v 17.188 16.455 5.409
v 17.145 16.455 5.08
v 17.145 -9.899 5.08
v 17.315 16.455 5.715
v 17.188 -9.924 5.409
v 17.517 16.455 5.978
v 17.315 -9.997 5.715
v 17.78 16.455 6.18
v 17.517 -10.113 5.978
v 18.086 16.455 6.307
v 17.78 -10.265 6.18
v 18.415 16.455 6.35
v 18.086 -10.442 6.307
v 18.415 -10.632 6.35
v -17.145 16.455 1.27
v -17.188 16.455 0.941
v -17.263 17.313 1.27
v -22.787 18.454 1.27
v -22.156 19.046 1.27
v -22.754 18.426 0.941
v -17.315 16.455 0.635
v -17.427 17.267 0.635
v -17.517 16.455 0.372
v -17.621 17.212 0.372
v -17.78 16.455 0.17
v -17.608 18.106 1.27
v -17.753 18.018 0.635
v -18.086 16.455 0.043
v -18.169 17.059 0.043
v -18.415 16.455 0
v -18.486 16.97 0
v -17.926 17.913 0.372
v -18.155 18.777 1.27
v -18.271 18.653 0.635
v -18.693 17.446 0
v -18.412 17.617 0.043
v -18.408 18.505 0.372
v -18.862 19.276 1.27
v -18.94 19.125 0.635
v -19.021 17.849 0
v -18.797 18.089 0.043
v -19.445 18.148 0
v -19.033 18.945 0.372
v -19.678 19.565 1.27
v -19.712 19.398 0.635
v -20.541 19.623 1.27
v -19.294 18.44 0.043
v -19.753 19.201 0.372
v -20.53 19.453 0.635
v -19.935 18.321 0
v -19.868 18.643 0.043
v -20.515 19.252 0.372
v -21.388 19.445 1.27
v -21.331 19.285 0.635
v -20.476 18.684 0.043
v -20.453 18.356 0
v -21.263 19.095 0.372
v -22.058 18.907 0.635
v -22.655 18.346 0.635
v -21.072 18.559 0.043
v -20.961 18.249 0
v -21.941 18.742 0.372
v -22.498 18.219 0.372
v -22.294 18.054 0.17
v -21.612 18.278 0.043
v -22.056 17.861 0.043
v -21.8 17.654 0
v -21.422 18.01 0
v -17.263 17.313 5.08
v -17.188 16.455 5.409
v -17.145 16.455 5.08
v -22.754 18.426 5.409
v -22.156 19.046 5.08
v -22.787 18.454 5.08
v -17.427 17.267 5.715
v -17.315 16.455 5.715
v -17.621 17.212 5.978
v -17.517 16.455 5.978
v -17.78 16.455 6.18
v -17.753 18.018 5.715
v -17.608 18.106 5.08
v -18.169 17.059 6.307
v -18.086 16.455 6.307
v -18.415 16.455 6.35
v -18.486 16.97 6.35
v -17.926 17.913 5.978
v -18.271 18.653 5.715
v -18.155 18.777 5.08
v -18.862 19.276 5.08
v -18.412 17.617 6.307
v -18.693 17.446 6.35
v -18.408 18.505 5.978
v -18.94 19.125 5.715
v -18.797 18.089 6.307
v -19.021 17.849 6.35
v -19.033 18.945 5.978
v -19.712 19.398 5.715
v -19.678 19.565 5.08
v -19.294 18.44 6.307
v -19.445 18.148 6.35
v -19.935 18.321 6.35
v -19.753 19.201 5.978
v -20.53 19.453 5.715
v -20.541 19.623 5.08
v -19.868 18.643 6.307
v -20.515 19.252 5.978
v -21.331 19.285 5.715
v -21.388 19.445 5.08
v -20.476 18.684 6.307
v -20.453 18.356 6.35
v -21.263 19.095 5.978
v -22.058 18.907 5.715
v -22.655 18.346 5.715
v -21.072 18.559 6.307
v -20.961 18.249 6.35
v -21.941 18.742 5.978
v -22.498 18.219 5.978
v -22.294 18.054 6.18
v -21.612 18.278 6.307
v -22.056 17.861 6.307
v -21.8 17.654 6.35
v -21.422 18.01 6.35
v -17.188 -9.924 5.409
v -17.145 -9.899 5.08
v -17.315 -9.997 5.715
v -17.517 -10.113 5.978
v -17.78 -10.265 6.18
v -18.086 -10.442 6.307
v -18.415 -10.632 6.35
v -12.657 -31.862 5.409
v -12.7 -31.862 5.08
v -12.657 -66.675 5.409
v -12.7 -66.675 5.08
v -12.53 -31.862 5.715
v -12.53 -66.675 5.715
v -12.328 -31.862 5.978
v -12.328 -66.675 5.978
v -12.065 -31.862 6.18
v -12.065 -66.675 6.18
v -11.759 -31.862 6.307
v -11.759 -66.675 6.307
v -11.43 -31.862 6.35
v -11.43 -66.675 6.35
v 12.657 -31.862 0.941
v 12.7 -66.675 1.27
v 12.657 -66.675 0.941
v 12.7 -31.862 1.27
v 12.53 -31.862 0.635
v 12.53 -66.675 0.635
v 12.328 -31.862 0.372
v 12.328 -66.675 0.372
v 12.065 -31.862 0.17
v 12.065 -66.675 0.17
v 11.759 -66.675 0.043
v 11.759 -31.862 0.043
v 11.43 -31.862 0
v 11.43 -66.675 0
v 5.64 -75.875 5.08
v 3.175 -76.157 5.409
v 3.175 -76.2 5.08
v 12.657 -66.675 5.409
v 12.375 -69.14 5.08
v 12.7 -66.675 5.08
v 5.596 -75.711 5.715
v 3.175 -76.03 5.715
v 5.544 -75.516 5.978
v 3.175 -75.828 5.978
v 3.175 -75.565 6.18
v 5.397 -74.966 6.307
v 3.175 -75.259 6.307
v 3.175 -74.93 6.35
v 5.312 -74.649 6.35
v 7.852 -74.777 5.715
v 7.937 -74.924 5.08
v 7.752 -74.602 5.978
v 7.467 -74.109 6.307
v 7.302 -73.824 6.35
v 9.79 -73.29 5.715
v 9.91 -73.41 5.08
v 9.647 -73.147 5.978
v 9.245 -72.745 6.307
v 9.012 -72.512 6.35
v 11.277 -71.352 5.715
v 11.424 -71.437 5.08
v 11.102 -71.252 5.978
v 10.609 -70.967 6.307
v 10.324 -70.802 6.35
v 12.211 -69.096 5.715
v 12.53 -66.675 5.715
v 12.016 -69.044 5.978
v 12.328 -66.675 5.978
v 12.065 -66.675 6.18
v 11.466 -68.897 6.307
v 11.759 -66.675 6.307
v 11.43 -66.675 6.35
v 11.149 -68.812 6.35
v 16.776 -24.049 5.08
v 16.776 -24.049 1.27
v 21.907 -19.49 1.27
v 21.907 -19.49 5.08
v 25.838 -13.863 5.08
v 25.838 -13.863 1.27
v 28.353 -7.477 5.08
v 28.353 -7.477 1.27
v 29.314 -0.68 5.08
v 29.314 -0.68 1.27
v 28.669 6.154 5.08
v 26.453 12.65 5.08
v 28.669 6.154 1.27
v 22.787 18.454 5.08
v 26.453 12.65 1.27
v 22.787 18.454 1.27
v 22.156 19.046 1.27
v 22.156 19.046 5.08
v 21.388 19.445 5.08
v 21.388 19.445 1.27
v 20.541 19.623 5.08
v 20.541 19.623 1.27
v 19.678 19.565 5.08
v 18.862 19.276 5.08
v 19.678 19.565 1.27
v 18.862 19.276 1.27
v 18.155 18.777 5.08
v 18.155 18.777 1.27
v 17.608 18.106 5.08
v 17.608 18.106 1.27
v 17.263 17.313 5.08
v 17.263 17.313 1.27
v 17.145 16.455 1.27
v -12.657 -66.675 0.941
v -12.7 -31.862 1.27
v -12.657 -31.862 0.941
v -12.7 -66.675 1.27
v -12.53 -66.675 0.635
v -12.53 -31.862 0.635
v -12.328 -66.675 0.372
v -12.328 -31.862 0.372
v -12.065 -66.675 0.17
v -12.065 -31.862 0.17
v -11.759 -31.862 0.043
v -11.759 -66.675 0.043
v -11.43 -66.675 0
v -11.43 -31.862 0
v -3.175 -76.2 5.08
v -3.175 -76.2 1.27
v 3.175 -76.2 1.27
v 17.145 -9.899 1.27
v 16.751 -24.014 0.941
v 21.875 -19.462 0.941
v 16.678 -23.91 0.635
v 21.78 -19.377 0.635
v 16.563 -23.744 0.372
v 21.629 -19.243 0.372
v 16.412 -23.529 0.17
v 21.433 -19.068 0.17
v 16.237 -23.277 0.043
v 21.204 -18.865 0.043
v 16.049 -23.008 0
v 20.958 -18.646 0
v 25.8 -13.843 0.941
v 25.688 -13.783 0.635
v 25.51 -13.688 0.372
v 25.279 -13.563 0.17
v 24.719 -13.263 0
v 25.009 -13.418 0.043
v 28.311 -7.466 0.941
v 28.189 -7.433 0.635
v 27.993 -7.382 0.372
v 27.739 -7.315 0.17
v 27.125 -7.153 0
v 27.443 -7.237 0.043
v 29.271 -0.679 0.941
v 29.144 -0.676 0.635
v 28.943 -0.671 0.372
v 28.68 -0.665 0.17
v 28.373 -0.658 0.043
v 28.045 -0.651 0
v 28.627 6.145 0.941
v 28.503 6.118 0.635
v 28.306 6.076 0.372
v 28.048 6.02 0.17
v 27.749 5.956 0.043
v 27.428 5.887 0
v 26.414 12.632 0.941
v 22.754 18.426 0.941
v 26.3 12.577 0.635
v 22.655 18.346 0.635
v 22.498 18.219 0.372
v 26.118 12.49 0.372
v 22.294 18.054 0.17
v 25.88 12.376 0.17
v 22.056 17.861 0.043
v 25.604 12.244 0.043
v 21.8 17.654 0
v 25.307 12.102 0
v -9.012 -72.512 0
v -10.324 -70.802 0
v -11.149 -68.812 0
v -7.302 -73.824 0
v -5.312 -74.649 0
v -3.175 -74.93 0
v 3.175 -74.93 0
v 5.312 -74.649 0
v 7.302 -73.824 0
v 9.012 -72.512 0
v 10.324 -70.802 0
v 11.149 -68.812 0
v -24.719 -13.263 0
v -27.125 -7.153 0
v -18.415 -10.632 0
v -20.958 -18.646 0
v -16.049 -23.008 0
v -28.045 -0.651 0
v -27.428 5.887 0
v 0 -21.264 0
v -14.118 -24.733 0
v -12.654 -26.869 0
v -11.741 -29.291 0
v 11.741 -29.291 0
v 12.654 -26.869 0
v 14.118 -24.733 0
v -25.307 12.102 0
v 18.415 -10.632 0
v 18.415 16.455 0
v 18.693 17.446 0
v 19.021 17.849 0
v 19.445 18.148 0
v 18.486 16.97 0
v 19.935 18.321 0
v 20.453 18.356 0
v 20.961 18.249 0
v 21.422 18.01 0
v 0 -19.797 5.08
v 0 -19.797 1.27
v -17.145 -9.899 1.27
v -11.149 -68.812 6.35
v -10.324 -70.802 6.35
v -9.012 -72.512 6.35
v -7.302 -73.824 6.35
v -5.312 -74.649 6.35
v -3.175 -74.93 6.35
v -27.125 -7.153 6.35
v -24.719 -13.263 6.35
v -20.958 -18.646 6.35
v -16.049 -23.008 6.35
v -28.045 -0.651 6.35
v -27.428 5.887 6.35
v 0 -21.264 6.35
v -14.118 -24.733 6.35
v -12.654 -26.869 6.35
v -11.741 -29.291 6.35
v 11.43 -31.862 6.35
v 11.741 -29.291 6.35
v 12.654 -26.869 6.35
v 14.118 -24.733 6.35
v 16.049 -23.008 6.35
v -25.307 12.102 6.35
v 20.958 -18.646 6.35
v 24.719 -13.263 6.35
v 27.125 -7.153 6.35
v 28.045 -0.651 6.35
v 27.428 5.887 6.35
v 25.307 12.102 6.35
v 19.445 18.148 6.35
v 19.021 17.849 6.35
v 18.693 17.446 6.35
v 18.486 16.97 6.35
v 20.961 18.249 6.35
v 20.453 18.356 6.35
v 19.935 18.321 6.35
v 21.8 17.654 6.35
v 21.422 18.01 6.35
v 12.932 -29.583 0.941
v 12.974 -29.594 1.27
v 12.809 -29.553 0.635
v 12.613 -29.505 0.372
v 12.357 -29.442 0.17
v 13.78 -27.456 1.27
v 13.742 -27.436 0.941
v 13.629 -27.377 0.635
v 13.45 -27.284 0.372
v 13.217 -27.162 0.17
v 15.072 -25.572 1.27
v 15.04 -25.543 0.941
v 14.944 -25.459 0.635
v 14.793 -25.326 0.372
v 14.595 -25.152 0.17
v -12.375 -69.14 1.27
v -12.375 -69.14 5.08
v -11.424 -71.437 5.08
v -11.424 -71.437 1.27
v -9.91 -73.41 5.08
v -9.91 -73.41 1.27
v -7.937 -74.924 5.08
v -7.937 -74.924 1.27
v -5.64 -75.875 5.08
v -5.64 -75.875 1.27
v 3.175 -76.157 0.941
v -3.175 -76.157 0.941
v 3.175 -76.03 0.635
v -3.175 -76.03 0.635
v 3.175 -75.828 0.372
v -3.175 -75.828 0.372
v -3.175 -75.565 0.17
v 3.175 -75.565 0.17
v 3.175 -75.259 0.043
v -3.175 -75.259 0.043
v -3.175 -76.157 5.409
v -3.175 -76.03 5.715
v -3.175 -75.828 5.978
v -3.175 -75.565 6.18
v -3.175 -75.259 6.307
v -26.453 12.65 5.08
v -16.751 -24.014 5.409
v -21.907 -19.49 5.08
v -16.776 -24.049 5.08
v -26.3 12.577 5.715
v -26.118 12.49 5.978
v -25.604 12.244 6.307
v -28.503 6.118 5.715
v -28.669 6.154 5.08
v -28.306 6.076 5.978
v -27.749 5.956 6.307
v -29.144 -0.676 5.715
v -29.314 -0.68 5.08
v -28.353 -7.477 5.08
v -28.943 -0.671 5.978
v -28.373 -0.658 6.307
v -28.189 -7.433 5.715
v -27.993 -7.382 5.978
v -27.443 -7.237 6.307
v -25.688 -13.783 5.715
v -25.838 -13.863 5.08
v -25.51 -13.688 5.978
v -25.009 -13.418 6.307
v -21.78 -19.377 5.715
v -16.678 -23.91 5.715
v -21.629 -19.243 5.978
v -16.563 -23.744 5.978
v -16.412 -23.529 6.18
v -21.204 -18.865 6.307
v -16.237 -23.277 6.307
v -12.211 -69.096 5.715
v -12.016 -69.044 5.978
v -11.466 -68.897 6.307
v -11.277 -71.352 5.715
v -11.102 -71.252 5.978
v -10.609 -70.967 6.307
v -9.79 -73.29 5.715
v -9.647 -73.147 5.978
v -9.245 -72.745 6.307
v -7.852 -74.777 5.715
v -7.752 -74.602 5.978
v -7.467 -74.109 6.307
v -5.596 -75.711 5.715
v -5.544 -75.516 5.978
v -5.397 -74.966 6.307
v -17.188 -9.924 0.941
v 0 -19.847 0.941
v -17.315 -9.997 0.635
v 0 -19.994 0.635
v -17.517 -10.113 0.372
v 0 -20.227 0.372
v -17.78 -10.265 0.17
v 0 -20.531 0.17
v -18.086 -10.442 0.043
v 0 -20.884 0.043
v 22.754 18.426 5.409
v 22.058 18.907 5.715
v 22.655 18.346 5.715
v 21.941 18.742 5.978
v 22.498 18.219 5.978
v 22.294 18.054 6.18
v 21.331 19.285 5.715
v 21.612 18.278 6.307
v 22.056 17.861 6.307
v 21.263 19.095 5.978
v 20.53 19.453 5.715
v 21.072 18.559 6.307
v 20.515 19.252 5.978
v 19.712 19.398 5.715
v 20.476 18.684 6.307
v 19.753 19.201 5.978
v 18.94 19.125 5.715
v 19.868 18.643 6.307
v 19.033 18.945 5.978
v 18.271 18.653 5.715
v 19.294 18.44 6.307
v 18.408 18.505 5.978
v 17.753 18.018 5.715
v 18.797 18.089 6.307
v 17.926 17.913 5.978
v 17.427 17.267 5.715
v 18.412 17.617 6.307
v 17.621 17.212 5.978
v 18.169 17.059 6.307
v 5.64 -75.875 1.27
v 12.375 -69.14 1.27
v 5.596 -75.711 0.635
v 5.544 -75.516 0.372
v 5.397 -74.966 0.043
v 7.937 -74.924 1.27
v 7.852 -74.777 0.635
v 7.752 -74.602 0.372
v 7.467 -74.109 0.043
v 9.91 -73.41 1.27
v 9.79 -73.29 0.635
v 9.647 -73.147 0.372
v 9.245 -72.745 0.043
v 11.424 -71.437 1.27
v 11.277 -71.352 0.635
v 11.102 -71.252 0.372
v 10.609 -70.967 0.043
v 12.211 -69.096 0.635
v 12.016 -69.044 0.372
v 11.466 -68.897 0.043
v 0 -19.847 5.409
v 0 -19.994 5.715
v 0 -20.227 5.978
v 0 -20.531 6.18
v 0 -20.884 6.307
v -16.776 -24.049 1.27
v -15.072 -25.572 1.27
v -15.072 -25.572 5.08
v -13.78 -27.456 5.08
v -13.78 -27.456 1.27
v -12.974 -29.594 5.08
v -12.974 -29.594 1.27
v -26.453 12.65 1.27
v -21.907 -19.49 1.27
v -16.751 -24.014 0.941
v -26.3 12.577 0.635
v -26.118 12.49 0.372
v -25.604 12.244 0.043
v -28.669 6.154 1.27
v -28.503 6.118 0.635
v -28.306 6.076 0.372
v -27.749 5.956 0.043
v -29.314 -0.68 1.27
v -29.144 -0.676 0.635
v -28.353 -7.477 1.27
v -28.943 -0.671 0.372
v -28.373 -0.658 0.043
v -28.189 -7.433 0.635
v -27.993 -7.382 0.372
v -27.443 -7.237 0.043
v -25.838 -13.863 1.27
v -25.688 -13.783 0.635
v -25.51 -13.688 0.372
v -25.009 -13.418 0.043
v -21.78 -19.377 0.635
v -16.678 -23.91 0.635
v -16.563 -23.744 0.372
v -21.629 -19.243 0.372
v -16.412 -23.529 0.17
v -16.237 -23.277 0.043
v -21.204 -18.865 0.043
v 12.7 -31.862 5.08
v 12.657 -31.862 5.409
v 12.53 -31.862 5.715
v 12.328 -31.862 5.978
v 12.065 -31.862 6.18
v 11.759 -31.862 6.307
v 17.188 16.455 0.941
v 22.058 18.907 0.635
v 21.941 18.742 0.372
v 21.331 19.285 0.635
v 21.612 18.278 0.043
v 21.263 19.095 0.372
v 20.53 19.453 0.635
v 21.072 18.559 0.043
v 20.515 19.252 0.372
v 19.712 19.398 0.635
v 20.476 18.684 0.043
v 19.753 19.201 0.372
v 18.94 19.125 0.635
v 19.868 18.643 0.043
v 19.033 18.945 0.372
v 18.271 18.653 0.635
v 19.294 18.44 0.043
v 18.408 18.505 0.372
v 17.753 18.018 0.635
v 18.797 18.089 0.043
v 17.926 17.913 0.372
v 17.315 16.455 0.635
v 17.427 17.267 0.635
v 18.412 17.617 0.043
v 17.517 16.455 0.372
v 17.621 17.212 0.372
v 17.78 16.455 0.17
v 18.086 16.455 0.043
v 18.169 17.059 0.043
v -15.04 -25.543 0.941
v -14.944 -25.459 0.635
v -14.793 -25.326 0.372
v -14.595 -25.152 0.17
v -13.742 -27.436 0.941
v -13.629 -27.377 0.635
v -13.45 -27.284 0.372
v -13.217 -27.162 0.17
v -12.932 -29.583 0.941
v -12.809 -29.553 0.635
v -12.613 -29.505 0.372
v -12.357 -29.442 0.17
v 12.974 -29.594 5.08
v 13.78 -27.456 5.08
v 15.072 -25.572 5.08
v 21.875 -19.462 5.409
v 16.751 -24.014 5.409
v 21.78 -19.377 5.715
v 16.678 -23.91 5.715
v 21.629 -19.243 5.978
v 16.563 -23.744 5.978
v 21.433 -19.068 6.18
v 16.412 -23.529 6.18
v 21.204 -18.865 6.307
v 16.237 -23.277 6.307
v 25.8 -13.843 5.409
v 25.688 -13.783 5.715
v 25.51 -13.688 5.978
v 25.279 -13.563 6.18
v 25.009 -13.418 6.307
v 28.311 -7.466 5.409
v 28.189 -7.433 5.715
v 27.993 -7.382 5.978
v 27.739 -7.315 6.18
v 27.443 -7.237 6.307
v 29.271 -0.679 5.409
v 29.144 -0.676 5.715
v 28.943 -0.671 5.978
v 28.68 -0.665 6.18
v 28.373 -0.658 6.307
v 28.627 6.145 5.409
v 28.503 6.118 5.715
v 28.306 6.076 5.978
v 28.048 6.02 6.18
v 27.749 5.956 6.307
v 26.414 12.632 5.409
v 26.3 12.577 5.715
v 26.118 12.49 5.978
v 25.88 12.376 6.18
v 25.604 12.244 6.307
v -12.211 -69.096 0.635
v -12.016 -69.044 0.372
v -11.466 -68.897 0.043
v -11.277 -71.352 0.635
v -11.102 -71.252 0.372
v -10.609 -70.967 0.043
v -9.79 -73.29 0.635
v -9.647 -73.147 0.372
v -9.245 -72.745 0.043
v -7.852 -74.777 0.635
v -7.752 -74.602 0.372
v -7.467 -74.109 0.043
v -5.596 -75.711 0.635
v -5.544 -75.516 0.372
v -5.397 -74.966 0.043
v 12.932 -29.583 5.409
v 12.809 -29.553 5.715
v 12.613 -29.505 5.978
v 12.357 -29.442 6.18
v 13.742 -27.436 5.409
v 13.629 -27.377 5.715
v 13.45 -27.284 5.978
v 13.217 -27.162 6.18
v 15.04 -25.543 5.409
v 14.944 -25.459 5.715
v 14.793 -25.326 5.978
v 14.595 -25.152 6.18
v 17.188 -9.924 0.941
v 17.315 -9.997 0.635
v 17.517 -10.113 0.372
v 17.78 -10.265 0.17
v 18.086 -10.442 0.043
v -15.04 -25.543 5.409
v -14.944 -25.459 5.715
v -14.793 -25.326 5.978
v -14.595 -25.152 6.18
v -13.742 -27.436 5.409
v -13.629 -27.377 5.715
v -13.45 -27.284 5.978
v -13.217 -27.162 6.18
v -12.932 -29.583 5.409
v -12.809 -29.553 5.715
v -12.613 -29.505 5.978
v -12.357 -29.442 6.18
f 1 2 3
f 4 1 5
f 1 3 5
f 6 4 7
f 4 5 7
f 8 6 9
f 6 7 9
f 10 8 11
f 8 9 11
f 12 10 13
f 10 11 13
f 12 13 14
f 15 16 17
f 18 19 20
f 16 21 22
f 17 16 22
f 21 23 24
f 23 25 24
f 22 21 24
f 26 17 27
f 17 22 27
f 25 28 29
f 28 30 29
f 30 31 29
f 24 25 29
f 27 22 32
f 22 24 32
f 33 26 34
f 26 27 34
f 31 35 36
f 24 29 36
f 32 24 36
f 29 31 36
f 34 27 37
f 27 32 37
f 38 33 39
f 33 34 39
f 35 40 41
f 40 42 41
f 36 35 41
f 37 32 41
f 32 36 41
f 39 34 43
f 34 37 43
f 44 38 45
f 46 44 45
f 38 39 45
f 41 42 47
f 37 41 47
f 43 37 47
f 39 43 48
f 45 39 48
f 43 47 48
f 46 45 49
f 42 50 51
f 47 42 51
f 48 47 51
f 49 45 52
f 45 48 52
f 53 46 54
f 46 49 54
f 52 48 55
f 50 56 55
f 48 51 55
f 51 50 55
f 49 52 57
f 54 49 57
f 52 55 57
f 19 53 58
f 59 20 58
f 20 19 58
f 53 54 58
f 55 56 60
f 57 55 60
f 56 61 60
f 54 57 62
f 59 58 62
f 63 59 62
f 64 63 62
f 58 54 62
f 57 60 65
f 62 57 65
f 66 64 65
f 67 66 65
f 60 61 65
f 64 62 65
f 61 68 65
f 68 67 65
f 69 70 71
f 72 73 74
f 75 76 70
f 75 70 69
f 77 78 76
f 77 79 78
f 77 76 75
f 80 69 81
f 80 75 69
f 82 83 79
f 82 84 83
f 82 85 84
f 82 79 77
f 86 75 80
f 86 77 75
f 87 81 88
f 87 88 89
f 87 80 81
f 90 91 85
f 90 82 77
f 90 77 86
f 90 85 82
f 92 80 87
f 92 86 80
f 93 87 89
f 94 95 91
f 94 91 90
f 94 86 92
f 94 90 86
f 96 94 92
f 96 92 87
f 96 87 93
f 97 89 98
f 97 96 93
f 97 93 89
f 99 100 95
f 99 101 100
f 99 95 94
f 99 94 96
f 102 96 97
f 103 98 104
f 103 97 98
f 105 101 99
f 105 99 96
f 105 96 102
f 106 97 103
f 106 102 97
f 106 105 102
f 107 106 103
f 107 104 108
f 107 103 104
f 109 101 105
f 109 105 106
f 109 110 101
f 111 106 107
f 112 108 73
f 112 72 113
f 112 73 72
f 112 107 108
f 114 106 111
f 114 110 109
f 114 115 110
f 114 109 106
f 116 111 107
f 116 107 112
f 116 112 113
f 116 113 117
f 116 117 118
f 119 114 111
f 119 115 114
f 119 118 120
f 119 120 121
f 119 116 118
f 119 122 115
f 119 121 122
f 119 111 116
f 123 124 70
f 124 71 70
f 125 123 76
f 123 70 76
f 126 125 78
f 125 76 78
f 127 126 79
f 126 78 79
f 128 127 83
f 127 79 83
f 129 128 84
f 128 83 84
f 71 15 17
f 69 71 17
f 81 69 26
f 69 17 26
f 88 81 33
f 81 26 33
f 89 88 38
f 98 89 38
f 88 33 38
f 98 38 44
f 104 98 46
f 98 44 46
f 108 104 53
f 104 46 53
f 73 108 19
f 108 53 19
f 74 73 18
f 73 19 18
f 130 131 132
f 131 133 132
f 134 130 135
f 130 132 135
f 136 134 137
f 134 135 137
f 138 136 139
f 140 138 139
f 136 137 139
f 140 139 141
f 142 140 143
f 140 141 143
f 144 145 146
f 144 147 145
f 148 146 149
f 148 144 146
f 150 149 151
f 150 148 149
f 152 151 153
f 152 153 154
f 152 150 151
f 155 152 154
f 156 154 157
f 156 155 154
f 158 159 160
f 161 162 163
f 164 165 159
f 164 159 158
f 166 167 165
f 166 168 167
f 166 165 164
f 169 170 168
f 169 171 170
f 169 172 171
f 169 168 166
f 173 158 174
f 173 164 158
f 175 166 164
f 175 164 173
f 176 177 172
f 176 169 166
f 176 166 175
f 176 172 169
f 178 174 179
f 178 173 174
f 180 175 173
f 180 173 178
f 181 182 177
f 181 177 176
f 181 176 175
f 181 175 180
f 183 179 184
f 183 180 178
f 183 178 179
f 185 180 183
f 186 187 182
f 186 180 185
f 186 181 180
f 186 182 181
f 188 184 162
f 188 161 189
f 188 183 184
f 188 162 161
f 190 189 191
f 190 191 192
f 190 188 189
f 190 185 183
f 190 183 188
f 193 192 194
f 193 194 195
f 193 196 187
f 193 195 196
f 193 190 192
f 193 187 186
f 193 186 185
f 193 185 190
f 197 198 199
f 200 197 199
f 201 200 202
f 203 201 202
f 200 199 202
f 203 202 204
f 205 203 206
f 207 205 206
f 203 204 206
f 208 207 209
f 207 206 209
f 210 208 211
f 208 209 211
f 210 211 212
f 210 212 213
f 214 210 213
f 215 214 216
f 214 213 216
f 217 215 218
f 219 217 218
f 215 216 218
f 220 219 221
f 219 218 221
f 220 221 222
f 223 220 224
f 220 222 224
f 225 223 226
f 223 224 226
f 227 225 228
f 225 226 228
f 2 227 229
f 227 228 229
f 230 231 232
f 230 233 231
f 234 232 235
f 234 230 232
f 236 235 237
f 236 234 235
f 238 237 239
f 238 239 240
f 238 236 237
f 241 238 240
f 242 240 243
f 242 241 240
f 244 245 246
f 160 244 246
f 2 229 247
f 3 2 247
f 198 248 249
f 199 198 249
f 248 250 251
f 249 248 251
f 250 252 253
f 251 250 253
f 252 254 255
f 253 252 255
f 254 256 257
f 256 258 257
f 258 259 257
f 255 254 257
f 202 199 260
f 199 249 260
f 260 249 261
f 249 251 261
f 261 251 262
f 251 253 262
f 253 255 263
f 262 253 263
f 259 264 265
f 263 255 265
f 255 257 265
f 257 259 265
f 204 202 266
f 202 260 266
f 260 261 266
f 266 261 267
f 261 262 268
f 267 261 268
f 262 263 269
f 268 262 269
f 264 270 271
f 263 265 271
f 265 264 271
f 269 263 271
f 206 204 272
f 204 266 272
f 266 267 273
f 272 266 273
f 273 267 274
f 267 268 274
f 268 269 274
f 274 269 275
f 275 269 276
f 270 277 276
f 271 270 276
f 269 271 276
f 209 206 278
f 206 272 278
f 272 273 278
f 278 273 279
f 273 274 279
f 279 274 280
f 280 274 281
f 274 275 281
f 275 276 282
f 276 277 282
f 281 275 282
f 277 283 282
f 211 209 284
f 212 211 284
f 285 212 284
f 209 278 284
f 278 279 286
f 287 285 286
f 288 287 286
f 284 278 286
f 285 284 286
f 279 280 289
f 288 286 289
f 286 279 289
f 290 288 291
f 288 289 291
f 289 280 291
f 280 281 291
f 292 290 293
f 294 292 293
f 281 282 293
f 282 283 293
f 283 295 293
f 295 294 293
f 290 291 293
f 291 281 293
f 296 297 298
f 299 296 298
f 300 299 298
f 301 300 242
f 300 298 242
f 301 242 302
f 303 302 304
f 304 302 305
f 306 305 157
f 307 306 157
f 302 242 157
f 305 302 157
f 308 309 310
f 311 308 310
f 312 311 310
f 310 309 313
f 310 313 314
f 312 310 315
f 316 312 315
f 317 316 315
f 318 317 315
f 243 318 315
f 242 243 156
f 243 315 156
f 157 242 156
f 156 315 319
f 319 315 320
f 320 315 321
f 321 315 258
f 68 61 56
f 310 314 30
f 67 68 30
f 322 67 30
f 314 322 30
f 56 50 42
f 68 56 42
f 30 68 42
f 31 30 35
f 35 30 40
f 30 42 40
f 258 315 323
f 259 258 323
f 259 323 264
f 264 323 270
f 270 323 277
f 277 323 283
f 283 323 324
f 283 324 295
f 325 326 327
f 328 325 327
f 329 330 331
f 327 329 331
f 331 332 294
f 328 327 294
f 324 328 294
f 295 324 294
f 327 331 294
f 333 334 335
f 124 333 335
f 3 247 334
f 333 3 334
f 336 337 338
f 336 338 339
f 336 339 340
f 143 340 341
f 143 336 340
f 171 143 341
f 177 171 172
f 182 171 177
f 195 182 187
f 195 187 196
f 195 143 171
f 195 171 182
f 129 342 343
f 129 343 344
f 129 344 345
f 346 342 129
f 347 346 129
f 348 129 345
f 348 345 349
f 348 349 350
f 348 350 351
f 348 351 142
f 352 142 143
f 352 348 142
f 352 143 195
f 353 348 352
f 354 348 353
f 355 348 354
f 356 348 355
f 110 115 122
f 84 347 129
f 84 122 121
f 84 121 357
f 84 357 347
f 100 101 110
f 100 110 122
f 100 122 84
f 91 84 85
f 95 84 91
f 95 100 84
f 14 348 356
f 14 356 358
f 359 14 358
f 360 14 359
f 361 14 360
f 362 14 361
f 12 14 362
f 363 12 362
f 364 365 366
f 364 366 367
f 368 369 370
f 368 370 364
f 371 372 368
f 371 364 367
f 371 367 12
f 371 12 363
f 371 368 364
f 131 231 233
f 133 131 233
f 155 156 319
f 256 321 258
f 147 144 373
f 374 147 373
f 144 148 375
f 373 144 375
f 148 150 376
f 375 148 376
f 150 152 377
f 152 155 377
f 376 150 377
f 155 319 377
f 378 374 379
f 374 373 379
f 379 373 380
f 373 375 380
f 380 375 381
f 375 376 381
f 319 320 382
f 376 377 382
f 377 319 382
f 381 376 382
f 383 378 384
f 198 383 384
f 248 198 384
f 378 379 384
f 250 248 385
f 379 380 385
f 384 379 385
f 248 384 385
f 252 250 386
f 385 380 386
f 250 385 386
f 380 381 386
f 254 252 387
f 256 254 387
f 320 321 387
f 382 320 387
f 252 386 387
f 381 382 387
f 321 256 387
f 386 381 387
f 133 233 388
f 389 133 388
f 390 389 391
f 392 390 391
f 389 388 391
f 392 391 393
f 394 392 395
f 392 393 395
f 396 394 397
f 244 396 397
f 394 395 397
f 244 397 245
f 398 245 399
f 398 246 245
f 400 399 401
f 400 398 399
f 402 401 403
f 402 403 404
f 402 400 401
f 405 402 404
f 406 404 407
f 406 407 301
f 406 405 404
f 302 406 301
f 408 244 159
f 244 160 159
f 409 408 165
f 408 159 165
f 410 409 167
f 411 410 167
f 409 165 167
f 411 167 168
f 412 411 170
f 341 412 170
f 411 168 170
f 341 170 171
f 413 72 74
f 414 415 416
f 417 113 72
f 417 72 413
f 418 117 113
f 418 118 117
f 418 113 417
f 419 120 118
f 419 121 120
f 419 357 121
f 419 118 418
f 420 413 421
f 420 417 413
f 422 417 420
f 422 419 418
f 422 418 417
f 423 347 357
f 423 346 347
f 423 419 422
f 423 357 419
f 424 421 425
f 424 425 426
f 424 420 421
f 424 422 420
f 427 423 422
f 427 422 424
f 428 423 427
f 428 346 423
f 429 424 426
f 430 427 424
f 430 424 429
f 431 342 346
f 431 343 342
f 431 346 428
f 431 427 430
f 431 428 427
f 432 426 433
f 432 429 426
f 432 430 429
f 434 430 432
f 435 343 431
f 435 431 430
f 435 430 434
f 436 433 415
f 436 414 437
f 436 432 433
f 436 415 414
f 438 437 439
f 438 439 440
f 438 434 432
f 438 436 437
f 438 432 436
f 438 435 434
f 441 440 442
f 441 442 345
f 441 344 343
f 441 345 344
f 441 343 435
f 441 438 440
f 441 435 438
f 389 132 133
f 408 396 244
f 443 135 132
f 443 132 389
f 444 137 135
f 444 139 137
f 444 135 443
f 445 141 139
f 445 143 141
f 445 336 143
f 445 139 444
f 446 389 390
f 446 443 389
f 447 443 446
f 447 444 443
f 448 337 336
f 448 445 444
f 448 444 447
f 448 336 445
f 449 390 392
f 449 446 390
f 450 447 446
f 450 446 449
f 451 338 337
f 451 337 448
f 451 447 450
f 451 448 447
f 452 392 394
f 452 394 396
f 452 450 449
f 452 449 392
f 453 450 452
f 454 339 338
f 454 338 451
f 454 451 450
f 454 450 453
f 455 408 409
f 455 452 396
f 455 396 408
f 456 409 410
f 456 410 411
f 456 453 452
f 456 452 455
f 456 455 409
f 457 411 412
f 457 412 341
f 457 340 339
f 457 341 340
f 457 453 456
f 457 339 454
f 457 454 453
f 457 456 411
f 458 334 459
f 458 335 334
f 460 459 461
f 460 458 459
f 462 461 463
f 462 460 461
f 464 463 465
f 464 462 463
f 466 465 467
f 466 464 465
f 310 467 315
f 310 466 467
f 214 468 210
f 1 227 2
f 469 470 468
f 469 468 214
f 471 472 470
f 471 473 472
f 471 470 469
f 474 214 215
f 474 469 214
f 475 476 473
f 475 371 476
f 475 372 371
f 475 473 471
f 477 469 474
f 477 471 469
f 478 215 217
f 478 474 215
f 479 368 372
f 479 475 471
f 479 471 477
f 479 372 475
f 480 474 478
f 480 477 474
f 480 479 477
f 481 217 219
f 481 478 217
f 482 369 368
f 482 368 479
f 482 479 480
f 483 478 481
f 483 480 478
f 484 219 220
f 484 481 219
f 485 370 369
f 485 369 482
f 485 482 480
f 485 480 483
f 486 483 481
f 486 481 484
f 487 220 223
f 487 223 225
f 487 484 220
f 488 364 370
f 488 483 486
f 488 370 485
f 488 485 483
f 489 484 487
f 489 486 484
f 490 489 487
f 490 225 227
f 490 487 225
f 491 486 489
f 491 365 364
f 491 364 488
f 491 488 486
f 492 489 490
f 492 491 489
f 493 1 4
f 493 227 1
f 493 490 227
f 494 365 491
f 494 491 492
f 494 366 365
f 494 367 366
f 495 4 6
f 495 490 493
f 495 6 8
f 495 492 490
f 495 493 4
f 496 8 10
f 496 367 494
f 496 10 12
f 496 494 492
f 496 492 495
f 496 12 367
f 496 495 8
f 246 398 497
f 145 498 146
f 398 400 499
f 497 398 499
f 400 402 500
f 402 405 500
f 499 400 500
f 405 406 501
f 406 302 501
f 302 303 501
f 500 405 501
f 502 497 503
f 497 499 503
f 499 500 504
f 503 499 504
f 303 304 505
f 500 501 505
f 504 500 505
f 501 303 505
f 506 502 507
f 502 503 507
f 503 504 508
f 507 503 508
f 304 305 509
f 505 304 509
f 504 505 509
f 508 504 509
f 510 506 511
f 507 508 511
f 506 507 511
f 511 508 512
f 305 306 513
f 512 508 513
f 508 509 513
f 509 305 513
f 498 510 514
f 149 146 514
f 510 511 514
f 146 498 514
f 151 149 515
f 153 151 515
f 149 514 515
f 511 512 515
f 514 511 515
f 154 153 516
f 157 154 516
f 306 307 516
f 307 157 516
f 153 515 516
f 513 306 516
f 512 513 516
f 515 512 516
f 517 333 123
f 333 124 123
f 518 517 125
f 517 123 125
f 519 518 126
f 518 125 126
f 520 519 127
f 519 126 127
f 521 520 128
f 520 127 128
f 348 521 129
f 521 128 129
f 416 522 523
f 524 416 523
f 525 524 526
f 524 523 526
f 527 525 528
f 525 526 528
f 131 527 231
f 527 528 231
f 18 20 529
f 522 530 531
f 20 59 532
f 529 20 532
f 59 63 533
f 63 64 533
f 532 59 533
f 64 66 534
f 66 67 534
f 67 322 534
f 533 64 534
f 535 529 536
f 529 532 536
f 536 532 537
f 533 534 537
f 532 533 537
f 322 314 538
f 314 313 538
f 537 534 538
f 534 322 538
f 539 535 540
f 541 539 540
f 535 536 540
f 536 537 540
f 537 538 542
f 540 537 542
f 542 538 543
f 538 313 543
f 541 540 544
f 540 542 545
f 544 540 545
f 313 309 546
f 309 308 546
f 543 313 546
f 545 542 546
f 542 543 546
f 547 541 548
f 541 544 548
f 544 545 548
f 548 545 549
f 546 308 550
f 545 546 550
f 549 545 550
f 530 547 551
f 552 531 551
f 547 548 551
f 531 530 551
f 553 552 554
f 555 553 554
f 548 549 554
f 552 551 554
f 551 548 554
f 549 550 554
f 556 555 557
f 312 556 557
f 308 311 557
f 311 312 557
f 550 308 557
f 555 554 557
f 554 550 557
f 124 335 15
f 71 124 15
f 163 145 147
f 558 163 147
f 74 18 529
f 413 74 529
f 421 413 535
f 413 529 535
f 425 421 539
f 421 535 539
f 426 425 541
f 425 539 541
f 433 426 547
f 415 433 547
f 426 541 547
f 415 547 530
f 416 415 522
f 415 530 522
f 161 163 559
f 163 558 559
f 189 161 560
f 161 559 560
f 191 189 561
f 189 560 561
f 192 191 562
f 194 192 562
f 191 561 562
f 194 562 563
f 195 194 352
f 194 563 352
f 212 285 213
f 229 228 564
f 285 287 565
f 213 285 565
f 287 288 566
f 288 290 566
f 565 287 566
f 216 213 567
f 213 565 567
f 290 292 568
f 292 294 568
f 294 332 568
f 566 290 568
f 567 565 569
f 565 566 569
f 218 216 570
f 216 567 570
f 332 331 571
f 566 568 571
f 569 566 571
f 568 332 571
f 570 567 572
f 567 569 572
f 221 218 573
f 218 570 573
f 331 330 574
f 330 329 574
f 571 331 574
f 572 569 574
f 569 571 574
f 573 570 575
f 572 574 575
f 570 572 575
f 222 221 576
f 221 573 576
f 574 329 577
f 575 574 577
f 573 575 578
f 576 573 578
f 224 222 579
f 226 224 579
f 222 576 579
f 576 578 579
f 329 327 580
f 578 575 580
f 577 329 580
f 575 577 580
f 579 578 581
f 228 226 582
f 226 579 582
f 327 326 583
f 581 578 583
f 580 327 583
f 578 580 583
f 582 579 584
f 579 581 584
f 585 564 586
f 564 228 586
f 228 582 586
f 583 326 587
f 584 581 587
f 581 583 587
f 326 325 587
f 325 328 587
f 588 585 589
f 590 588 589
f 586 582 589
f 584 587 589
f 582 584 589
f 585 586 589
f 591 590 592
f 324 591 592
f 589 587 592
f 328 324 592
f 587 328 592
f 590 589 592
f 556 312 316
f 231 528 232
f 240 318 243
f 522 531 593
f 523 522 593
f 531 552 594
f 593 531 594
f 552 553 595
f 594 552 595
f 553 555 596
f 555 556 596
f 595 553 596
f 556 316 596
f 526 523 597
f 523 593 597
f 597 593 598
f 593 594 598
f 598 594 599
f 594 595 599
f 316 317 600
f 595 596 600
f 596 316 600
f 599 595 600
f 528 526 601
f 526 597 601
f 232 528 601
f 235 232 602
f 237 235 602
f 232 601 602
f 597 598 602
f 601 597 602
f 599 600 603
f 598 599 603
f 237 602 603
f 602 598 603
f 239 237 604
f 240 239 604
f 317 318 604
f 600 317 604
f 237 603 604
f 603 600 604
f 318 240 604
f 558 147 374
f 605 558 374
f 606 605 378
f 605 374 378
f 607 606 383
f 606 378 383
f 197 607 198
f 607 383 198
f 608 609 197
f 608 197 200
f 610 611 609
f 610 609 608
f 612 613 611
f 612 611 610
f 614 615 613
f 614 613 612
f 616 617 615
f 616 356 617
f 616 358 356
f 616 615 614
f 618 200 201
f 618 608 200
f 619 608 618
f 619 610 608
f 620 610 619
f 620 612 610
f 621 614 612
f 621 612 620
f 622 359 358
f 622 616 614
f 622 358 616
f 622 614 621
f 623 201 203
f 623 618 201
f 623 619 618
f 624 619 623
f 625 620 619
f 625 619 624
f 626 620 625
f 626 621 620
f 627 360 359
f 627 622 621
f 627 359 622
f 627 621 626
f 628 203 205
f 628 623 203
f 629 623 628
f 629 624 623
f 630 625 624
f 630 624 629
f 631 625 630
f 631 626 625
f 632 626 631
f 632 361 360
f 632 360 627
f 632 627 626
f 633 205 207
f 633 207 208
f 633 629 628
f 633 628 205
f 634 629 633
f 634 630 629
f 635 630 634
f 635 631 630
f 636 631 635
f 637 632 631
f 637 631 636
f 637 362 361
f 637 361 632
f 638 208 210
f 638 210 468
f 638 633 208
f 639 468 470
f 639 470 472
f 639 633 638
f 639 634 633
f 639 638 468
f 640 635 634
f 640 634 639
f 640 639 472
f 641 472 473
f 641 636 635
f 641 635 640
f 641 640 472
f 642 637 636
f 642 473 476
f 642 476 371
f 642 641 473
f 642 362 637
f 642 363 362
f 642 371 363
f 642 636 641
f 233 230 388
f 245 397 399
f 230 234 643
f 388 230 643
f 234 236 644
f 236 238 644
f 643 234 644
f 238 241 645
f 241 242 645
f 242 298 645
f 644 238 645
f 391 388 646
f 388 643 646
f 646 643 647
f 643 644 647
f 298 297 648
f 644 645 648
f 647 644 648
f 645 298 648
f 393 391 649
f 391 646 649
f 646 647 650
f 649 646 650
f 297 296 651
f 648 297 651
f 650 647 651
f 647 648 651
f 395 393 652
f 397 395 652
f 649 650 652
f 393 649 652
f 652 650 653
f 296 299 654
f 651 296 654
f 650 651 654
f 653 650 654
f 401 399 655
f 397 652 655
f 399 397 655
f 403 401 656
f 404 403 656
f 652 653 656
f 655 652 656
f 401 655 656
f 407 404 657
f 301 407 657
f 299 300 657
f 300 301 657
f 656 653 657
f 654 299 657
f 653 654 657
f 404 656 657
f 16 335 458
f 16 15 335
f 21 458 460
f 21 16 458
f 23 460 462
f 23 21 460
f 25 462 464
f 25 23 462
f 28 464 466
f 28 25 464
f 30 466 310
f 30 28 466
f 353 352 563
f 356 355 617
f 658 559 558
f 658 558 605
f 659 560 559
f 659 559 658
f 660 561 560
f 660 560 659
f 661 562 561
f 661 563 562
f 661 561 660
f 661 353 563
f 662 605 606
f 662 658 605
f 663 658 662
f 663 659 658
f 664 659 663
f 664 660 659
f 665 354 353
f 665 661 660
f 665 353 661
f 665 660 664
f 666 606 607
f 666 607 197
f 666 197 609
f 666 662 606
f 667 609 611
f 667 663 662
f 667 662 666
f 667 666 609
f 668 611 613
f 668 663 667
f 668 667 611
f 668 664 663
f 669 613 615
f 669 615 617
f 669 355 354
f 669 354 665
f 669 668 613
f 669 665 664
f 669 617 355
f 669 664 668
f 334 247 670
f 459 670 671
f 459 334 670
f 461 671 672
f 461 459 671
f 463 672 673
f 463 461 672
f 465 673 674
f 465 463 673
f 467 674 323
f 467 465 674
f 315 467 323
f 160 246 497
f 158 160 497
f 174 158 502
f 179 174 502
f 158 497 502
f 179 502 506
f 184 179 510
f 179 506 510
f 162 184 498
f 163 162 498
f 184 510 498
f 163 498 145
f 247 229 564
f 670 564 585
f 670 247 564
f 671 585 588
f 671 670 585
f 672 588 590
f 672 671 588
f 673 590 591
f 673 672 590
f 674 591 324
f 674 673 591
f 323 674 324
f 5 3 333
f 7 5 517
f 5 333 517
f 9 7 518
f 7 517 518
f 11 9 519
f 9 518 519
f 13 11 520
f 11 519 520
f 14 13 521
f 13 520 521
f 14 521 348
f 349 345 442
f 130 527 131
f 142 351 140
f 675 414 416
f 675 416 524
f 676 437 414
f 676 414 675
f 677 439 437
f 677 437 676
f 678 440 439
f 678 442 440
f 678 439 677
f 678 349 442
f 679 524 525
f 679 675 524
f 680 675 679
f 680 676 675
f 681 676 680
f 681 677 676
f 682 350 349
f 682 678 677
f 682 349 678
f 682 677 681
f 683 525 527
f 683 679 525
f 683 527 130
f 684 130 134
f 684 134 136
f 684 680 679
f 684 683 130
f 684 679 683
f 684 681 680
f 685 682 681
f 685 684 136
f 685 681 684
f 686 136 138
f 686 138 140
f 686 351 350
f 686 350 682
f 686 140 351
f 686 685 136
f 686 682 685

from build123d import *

# Parameters (mm, degrees)
F1_DEPTH = 6.35
F2_R     = 1.27


with BuildPart() as f1:
    # F0 (on Top) → F1 (new body)
    with BuildSketch(Plane.XY):
        with BuildLine():
            Line((17.145, 16.455425), (17.145, 9.89867))
            Line((17.145, 9.89867), (17.145, -9.89867))
            Line((17.145, -9.89867), (0, -19.797341))
            Line((0, -19.797341), (-17.145, -9.89867))
            Line((-17.145, -9.89867), (-17.145, 9.89867))
            Line((-17.145, 9.89867), (-17.145, 16.455425))
            ThreePointArc((-17.145, 16.455425), (-19.260136, 19.448303), (-22.787402, 18.453563))
            ThreePointArc((-22.787402, 18.453563), (-29.033356, -4.106567), (-16.775641, -24.049481))
            ThreePointArc((-16.775641, -24.049481), (-13.780156, -27.455953), (-12.7, -31.861658))
            Line((-12.7, -31.861658), (-12.7, -66.675))
            ThreePointArc((-12.7, -66.675), (-9.910192, -73.410192), (-3.175, -76.2))
            Line((-3.175, -76.2), (3.175, -76.2))
            ThreePointArc((3.175, -76.2), (9.910192, -73.410192), (12.7, -66.675))
            Line((12.7, -66.675), (12.7, -31.861658))
            ThreePointArc((12.7, -31.861658), (13.780156, -27.455953), (16.775641, -24.049481))
            ThreePointArc((16.775641, -24.049481), (29.033356, -4.106567), (22.787402, 18.453563))
            ThreePointArc((22.787402, 18.453563), (19.260136, 19.448303), (17.145, 16.455425))
        make_face()
    extrude(amount=F1_DEPTH)

    # F2
    f2_edges = [f1.edges().sort_by_distance(p)[0] for p in [
        (-13.780156, -27.455953, 6.35),
        (-12.7, -49.268329, 6.35),
        (-9.910192, -73.410192, 6.35),
        (0, -76.2, 6.35),
        (9.910192, -73.410192, 6.35),
        (12.7, -49.268329, 6.35),
        (13.780156, -27.455953, 6.35),
        (29.033356, -4.106567, 6.35),
        (19.260136, 19.448303, 6.35),
        (17.145, 3.278378, 6.35),
        (8.5725, -14.848006, 6.35),
        (-8.5725, -14.848006, 6.35),
        (-17.145, 3.278378, 6.35),
        (-19.260136, 19.448303, 6.35),
        (-29.033356, -4.106567, 6.35),
        (-13.780156, -27.455953, 0),
        (-12.7, -49.268329, 0),
        (-9.910192, -73.410192, 0),
        (0, -76.2, 0),
        (9.910192, -73.410192, 0),
        (12.7, -49.268329, 0),
        (13.780156, -27.455953, 0),
        (29.033356, -4.106567, 0),
        (19.260136, 19.448303, 0),
        (17.145, 3.278378, 0),
        (8.5725, -14.848006, 0),
        (-8.5725, -14.848006, 0),
        (-17.145, 3.278378, 0),
        (-19.260136, 19.448303, 0),
        (-29.033356, -4.106567, 0),
    ]]
    fillet(f2_edges, radius=F2_R)


solid = f1.part
